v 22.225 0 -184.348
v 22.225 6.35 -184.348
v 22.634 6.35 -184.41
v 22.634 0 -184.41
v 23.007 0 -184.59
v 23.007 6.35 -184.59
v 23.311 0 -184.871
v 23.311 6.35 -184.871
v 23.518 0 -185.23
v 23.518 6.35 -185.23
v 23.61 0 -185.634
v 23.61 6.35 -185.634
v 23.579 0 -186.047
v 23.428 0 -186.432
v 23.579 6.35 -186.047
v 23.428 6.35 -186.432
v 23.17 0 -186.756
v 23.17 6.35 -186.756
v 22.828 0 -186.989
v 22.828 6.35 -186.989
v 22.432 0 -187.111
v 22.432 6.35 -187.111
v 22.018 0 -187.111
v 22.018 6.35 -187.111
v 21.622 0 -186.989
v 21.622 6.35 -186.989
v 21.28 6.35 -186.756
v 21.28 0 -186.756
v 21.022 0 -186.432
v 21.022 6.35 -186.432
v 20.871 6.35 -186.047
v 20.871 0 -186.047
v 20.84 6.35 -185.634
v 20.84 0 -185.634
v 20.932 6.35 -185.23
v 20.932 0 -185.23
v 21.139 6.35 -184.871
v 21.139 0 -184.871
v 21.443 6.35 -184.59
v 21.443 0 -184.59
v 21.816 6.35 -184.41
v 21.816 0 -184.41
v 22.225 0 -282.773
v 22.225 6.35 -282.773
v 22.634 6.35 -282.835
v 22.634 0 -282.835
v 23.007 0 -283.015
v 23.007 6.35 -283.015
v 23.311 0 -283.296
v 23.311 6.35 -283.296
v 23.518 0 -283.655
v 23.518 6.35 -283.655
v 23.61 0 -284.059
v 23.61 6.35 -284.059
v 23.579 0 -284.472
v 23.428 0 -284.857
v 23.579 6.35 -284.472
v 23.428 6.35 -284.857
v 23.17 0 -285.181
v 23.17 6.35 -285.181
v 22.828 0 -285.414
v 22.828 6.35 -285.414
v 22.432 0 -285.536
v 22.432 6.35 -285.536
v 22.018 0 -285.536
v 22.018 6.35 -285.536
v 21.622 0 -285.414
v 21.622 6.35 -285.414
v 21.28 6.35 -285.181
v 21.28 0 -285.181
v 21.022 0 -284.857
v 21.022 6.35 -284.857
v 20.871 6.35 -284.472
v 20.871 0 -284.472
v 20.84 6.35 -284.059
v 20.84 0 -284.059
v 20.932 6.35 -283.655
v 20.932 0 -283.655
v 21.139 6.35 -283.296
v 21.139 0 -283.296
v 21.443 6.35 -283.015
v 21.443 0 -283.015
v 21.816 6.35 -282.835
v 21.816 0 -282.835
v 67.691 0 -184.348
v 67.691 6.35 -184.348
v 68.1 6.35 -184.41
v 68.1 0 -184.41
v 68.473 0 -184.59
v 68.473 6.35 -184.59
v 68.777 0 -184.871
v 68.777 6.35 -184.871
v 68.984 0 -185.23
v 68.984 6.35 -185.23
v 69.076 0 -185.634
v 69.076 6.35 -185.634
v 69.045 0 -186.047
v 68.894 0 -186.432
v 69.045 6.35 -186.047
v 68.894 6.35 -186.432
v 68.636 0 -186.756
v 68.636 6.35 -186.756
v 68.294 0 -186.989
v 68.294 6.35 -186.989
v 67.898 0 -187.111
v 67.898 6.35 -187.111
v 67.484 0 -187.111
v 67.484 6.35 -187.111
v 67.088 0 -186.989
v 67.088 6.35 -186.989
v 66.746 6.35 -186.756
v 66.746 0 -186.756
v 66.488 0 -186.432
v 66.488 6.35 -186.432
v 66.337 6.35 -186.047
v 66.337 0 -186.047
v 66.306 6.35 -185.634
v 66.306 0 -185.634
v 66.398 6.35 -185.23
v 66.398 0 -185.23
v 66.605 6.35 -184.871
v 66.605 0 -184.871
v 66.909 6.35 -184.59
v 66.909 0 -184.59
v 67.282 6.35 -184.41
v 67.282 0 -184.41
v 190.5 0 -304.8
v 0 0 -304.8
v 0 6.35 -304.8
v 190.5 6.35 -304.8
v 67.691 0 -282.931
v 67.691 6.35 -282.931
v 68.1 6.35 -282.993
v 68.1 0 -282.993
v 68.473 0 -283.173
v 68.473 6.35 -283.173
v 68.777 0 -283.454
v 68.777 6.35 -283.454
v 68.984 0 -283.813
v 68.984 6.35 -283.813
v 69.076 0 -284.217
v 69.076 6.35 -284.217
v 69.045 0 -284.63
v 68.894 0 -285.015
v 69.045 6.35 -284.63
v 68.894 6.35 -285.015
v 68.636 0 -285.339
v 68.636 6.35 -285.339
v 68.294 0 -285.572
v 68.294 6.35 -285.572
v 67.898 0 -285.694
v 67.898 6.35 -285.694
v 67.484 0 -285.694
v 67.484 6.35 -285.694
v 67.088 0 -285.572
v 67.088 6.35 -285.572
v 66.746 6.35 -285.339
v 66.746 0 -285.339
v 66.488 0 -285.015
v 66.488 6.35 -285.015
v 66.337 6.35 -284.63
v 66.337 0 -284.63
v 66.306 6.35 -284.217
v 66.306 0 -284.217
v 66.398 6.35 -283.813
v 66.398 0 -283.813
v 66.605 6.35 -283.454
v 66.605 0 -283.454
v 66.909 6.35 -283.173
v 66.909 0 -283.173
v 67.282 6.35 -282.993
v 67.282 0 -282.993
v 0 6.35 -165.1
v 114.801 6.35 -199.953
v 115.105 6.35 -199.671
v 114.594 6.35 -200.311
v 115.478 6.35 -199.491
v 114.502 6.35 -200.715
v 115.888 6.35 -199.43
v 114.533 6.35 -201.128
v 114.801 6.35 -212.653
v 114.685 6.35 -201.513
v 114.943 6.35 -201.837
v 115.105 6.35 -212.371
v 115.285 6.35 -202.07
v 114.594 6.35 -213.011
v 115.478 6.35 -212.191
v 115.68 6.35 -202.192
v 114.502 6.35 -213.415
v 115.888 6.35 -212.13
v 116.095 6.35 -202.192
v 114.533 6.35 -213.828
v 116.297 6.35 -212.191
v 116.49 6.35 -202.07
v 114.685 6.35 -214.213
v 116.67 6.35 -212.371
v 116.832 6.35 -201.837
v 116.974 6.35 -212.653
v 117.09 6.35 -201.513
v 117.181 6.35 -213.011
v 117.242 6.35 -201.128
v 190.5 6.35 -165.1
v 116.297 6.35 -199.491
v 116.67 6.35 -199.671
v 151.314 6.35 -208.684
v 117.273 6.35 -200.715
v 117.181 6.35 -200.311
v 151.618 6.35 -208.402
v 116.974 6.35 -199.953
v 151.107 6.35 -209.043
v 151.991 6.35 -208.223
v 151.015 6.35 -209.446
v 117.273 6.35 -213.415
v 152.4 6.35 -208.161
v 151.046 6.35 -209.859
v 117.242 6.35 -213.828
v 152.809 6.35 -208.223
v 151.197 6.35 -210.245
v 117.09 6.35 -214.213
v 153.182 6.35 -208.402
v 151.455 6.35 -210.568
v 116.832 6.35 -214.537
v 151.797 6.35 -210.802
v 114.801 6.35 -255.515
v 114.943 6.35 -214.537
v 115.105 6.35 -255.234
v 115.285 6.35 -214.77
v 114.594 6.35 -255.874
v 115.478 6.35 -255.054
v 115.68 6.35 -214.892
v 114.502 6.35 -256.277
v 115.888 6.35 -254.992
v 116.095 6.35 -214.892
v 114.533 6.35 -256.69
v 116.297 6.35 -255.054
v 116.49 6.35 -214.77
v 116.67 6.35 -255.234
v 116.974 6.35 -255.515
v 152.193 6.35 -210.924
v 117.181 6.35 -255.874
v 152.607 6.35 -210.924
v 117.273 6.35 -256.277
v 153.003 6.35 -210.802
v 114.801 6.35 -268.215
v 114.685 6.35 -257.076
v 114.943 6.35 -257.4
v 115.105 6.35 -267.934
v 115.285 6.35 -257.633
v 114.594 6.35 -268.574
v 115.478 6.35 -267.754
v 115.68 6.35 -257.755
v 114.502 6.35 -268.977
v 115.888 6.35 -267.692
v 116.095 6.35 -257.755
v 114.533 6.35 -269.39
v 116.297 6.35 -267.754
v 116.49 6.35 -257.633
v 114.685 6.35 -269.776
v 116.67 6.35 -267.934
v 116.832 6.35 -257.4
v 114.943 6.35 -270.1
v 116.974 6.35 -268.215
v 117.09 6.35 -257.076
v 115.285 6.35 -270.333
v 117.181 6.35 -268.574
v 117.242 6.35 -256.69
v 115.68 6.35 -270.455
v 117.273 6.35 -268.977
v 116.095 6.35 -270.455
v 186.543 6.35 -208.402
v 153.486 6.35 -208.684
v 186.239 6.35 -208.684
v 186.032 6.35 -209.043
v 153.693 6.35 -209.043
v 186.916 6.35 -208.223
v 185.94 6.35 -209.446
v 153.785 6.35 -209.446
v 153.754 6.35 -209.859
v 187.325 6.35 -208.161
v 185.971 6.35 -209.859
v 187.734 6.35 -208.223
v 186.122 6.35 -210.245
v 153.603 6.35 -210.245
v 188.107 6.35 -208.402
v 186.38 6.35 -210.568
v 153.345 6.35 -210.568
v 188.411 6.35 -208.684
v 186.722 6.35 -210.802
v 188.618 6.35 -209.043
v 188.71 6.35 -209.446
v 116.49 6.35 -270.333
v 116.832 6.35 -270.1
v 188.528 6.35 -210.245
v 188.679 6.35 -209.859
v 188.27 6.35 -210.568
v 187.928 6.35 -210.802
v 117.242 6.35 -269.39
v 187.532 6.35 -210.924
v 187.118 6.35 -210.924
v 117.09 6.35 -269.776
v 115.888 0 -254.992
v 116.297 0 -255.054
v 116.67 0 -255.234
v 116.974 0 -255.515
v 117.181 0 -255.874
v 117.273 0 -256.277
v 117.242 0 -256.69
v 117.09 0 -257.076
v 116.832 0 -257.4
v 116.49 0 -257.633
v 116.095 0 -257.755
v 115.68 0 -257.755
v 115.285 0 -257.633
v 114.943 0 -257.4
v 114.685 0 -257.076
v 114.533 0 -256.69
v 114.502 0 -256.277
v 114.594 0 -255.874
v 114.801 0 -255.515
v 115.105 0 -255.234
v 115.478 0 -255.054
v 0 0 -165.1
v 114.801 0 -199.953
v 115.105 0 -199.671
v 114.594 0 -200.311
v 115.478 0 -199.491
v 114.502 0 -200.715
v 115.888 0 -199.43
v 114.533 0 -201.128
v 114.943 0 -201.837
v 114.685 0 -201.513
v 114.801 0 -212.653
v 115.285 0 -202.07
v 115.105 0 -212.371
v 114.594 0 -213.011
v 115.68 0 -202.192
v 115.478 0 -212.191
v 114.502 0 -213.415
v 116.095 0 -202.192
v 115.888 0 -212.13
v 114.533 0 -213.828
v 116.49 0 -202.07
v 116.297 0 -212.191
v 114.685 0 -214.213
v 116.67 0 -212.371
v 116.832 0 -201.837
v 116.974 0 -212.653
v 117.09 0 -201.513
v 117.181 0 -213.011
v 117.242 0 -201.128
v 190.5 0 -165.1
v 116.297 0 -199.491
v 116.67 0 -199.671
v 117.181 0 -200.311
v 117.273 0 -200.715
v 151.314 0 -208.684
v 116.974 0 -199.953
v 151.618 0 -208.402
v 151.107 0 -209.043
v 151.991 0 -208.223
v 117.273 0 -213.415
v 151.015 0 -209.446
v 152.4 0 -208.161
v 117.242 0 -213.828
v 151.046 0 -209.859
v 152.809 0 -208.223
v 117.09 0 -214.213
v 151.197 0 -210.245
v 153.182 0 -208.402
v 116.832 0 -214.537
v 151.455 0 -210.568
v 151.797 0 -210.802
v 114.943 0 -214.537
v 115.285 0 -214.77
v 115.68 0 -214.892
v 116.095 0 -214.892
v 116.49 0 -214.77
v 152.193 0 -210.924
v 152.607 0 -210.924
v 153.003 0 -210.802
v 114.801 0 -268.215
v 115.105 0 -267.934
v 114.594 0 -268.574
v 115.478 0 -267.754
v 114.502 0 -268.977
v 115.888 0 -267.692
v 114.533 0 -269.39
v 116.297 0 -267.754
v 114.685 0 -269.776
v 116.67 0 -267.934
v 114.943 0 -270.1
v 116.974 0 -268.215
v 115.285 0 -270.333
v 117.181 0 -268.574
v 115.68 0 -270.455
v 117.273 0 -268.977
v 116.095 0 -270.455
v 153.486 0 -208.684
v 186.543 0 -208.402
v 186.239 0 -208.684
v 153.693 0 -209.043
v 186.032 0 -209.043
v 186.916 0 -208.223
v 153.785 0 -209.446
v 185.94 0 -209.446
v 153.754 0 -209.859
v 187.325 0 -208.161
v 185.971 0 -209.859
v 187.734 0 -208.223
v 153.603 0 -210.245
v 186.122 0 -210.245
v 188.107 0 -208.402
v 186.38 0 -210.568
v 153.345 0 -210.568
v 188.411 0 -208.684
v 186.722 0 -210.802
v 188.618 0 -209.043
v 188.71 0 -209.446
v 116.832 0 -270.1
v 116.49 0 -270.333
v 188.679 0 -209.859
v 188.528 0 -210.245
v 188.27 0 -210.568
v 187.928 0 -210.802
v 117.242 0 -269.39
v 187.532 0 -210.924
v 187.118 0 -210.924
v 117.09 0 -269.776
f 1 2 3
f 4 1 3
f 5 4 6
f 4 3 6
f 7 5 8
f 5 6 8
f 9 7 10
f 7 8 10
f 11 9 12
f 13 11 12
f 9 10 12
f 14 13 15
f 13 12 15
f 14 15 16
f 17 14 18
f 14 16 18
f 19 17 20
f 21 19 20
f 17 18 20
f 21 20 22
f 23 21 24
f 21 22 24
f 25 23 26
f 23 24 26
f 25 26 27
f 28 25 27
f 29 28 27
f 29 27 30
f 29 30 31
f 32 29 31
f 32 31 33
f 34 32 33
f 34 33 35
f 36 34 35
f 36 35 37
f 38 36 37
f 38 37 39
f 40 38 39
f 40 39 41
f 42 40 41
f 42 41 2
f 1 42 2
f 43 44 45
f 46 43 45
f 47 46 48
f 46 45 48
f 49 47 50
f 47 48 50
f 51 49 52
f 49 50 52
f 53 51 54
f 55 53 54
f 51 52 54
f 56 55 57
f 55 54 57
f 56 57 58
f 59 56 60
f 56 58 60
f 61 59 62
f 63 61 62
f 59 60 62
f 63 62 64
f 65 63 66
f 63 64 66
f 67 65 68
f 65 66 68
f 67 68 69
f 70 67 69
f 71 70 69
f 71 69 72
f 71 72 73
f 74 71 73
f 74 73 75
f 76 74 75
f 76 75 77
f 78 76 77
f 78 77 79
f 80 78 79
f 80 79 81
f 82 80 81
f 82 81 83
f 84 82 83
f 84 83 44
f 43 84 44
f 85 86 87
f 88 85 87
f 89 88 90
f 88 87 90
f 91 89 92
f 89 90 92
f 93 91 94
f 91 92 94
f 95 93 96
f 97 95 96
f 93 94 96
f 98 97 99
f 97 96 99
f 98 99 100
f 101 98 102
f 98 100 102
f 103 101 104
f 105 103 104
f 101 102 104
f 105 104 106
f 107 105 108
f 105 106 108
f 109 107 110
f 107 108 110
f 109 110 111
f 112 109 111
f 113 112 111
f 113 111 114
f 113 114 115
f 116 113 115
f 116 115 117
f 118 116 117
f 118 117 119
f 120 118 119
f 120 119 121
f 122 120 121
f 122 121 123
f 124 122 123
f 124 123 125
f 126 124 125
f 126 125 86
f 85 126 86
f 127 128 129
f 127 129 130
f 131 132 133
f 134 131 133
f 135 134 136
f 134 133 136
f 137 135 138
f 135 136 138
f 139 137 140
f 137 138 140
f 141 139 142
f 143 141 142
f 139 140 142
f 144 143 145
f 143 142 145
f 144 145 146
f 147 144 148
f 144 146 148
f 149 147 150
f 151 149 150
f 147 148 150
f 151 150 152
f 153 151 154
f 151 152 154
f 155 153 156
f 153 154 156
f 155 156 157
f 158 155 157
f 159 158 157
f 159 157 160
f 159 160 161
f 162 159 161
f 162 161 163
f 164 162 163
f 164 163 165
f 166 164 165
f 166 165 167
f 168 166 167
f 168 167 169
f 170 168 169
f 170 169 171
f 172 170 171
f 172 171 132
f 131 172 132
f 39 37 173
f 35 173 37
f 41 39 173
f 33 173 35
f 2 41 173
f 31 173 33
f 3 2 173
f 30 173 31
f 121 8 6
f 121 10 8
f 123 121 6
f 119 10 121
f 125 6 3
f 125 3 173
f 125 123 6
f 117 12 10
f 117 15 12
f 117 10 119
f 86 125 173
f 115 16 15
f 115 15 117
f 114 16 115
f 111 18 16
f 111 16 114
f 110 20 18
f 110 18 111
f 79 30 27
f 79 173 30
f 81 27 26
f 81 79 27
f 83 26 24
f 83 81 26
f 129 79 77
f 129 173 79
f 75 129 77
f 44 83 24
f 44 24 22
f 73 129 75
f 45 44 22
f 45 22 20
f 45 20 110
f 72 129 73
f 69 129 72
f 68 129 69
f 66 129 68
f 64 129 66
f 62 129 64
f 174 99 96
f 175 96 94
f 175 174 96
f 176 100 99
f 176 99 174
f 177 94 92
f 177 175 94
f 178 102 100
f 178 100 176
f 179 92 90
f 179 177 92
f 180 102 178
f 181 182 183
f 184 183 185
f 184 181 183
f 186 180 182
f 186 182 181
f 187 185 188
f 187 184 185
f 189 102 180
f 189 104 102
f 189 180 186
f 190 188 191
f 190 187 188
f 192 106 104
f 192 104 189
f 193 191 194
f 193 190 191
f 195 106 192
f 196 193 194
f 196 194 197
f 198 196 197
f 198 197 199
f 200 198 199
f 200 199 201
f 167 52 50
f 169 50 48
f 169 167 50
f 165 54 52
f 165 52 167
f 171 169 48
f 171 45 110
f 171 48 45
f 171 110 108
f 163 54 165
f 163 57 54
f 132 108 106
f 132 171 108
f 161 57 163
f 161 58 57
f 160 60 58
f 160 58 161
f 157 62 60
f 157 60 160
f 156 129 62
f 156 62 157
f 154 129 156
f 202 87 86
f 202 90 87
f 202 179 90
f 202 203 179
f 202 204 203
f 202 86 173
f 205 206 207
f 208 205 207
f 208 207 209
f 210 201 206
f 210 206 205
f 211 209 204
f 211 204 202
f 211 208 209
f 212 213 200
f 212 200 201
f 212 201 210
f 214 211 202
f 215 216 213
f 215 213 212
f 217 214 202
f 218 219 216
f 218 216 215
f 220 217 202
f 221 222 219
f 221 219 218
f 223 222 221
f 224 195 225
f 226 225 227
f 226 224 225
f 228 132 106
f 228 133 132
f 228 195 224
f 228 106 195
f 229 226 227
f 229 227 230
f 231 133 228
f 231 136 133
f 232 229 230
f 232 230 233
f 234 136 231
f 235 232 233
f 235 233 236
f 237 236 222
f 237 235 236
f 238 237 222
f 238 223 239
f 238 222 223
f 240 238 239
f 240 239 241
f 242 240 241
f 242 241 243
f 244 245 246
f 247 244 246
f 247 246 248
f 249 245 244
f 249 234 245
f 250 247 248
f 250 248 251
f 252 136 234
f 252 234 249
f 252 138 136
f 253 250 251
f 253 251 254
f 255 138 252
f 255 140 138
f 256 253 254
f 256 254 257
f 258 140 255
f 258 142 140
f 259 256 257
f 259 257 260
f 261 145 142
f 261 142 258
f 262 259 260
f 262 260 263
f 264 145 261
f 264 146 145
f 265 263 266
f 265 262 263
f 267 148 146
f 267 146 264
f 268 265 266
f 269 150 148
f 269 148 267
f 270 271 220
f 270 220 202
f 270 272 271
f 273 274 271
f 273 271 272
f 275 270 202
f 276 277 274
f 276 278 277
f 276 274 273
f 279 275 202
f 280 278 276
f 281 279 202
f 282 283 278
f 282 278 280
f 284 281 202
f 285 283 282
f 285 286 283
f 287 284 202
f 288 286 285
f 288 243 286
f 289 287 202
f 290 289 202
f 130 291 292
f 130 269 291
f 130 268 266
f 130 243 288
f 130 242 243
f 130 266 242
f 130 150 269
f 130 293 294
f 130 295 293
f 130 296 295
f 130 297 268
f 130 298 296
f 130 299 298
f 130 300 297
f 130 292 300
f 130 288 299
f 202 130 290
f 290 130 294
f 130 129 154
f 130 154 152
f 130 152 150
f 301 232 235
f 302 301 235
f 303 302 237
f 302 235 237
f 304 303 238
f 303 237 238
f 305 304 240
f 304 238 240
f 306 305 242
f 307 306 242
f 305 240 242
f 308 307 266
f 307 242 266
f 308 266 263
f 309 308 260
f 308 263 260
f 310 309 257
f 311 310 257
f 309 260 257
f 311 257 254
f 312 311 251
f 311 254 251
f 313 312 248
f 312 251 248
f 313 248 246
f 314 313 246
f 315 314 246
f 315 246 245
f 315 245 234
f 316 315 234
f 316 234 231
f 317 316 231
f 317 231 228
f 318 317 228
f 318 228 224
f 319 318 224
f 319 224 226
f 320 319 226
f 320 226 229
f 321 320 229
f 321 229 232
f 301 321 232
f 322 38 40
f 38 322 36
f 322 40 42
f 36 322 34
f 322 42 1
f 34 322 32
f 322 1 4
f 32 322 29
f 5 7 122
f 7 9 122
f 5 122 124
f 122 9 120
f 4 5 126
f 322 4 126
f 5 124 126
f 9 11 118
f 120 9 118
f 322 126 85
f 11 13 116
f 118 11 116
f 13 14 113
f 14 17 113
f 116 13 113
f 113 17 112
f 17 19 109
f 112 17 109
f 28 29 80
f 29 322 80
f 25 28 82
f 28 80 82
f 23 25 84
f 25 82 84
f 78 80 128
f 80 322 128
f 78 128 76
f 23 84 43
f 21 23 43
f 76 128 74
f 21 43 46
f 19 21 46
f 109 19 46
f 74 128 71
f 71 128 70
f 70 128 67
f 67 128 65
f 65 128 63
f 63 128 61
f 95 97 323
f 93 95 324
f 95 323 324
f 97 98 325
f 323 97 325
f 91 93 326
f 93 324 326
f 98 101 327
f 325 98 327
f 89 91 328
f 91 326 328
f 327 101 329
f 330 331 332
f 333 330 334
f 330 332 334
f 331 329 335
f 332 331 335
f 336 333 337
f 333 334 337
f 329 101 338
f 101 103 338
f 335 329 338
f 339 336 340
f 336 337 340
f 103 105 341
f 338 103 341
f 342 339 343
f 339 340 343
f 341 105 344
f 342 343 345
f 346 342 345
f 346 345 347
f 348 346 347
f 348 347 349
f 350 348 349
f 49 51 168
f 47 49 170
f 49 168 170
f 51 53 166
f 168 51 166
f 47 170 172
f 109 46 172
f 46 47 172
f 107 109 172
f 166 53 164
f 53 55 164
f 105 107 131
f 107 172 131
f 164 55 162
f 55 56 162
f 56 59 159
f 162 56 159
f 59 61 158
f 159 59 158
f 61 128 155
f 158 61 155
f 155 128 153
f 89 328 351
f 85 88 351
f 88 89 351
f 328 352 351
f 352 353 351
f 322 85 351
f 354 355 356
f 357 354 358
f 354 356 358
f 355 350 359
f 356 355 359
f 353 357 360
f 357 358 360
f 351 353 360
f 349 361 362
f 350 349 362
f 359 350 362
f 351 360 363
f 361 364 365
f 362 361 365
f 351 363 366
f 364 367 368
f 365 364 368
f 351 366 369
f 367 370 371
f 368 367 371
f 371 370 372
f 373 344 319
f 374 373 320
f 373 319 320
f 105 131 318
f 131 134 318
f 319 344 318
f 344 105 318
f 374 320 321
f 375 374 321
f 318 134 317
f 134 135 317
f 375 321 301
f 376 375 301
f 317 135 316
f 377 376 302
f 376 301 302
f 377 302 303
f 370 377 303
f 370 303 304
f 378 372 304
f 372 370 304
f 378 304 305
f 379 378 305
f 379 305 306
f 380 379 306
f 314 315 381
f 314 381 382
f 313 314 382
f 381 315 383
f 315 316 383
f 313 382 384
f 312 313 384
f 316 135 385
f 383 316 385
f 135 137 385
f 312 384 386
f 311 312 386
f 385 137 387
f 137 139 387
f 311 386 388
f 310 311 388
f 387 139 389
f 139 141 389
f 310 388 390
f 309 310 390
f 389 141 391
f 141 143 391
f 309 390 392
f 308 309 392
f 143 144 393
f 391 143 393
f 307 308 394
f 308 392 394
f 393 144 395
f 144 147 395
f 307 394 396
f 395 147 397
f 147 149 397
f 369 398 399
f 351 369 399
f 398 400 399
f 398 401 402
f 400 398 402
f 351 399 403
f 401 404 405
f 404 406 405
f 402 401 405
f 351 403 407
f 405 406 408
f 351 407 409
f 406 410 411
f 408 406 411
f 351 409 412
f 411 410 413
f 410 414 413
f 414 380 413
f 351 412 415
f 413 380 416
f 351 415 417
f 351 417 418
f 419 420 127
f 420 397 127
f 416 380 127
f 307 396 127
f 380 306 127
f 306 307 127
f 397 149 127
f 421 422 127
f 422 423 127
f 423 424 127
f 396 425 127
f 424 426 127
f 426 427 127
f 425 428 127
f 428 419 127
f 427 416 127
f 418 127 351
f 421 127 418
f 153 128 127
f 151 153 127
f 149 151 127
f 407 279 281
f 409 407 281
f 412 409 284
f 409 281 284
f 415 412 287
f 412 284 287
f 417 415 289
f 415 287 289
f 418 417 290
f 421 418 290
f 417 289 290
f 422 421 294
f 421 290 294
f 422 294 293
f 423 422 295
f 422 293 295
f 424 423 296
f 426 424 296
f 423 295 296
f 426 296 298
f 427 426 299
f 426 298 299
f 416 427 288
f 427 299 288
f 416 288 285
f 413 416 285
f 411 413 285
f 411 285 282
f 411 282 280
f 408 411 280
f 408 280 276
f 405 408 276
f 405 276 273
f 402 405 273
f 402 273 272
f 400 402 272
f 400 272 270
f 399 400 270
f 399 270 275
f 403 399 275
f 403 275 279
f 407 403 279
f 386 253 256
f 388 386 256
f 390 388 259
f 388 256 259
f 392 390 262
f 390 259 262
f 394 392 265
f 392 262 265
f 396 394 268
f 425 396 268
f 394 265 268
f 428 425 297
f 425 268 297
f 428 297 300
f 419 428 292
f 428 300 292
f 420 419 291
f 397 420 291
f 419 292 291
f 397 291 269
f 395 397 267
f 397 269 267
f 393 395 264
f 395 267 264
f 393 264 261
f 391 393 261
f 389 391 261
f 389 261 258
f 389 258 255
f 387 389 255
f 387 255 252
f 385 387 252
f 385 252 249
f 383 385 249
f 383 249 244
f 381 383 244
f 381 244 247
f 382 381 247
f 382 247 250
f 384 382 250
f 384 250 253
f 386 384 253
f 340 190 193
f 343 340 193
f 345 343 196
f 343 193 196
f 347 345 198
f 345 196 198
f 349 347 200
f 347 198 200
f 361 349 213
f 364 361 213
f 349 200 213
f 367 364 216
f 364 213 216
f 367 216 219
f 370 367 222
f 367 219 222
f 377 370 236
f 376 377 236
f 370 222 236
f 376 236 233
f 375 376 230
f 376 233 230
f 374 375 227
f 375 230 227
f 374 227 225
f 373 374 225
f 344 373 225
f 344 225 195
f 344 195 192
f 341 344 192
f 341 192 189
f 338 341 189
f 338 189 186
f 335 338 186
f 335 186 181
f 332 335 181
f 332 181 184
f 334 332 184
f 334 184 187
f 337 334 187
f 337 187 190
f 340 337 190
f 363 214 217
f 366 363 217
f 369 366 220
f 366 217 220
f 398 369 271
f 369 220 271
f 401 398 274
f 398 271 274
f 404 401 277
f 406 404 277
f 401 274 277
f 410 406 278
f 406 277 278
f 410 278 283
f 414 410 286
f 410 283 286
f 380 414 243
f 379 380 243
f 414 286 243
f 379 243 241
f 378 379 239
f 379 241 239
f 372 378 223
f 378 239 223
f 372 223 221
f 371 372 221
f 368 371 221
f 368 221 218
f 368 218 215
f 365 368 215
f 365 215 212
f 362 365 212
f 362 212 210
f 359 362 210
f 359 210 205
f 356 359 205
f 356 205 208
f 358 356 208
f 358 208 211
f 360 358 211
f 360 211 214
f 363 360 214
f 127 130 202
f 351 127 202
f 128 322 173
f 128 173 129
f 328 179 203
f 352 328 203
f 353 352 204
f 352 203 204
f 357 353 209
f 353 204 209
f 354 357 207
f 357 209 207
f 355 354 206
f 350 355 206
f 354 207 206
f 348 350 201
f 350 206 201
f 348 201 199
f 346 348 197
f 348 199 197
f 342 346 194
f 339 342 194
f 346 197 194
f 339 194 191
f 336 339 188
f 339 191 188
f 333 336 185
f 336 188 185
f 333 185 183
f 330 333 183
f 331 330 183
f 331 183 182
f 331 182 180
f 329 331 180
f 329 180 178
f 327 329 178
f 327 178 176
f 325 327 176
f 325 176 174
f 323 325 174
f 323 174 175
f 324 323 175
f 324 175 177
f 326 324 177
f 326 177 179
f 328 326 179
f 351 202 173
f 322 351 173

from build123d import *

# Parameters (mm, degrees)
SKETCH1_W           = 304.8
SKETCH1_H           = 304.8
BOSS_EXTRUDE1_DEPTH = 6.35
CUT_EXTRUDE1_DEPTH  = 432.099063441
SKETCH3_R           = 1.3890625
CUT_EXTRUDE2_DEPTH  = 360.49076831
SKETCH4_R           = 1.3890625
CUT_EXTRUDE3_DEPTH  = 360.49076831
SKETCH5_R           = 1.3890625
CUT_EXTRUDE4_DEPTH  = 360.49076831


with BuildPart() as part:
    # Sketch1 → Boss-Extrude1 (new body)
    with BuildSketch(Plane(origin=(0, 0, 0), x_dir=(1, 0, 0), z_dir=(0, 1, 0))):
        with Locations((152.4, 152.4)):
            Rectangle(SKETCH1_W, SKETCH1_H)
    extrude(amount=BOSS_EXTRUDE1_DEPTH)

    # Sketch2 → Cut-Extrude1 (cut, through all)
    with BuildSketch(Plane(origin=(0, 6.35, 0), x_dir=(1, 0, 0), z_dir=(0, 1, 0))):
        Polygon((190.5, 304.8), (190.5, 165.1), (0, 165.1), (0, 0), (304.8, 0), (304.8, 304.8), align=None)
    extrude(amount=-CUT_EXTRUDE1_DEPTH, mode=Mode.SUBTRACT)

    # Sketch3 → Cut-Extrude2 (cut, through all)
    with BuildSketch(Plane(origin=(0, 6.35, 0), x_dir=(1, 0, 0), z_dir=(0, 1, 0))):
        with Locations(Location((22.225, 185.7375, 0), (0, 0, 270))):
            Circle(SKETCH3_R)
        with Locations(Location((67.691, 185.7375, 0), (0, 0, 270))):
            Circle(SKETCH3_R)
        with Locations(Location((22.225, 284.1625, 0), (0, 0, 270))):
            Circle(SKETCH3_R)
        with Locations(Location((67.691, 284.320434064, 0), (0, 0, 270))):
            Circle(SKETCH3_R)
    extrude(amount=-CUT_EXTRUDE2_DEPTH, mode=Mode.SUBTRACT)

    # Sketch4 → Cut-Extrude3 (cut, through all)
    with BuildSketch(Plane(origin=(0, 6.35, 0), x_dir=(1, 0, 0), z_dir=(0, 1, 0))):
        with Locations(Location((115.8875, 269.08125, 0), (0, 0, 270))):
            Circle(SKETCH4_R)
        with Locations(Location((115.8875, 256.38125, 0), (0, 0, 270))):
            Circle(SKETCH4_R)
        with Locations(Location((115.8875, 200.81875, 0), (0, 0, 270))):
            Circle(SKETCH4_R)
        with Locations(Location((115.8875, 213.51875, 0), (0, 0, 270))):
            Circle(SKETCH4_R)
    extrude(amount=-CUT_EXTRUDE3_DEPTH, mode=Mode.SUBTRACT)

    # Sketch5 → Cut-Extrude4 (cut, through all)
    with BuildSketch(Plane(origin=(0, 6.35, 0), x_dir=(1, 0, 0), z_dir=(0, 1, 0))):
        with Locations(Location((187.325, 209.55, 0), (0, 0, 270))):
            Circle(SKETCH5_R)
        with Locations(Location((152.4, 209.55, 0), (0, 0, 270))):
            Circle(SKETCH5_R)
    extrude(amount=-CUT_EXTRUDE4_DEPTH, mode=Mode.SUBTRACT)


solid = part.part
